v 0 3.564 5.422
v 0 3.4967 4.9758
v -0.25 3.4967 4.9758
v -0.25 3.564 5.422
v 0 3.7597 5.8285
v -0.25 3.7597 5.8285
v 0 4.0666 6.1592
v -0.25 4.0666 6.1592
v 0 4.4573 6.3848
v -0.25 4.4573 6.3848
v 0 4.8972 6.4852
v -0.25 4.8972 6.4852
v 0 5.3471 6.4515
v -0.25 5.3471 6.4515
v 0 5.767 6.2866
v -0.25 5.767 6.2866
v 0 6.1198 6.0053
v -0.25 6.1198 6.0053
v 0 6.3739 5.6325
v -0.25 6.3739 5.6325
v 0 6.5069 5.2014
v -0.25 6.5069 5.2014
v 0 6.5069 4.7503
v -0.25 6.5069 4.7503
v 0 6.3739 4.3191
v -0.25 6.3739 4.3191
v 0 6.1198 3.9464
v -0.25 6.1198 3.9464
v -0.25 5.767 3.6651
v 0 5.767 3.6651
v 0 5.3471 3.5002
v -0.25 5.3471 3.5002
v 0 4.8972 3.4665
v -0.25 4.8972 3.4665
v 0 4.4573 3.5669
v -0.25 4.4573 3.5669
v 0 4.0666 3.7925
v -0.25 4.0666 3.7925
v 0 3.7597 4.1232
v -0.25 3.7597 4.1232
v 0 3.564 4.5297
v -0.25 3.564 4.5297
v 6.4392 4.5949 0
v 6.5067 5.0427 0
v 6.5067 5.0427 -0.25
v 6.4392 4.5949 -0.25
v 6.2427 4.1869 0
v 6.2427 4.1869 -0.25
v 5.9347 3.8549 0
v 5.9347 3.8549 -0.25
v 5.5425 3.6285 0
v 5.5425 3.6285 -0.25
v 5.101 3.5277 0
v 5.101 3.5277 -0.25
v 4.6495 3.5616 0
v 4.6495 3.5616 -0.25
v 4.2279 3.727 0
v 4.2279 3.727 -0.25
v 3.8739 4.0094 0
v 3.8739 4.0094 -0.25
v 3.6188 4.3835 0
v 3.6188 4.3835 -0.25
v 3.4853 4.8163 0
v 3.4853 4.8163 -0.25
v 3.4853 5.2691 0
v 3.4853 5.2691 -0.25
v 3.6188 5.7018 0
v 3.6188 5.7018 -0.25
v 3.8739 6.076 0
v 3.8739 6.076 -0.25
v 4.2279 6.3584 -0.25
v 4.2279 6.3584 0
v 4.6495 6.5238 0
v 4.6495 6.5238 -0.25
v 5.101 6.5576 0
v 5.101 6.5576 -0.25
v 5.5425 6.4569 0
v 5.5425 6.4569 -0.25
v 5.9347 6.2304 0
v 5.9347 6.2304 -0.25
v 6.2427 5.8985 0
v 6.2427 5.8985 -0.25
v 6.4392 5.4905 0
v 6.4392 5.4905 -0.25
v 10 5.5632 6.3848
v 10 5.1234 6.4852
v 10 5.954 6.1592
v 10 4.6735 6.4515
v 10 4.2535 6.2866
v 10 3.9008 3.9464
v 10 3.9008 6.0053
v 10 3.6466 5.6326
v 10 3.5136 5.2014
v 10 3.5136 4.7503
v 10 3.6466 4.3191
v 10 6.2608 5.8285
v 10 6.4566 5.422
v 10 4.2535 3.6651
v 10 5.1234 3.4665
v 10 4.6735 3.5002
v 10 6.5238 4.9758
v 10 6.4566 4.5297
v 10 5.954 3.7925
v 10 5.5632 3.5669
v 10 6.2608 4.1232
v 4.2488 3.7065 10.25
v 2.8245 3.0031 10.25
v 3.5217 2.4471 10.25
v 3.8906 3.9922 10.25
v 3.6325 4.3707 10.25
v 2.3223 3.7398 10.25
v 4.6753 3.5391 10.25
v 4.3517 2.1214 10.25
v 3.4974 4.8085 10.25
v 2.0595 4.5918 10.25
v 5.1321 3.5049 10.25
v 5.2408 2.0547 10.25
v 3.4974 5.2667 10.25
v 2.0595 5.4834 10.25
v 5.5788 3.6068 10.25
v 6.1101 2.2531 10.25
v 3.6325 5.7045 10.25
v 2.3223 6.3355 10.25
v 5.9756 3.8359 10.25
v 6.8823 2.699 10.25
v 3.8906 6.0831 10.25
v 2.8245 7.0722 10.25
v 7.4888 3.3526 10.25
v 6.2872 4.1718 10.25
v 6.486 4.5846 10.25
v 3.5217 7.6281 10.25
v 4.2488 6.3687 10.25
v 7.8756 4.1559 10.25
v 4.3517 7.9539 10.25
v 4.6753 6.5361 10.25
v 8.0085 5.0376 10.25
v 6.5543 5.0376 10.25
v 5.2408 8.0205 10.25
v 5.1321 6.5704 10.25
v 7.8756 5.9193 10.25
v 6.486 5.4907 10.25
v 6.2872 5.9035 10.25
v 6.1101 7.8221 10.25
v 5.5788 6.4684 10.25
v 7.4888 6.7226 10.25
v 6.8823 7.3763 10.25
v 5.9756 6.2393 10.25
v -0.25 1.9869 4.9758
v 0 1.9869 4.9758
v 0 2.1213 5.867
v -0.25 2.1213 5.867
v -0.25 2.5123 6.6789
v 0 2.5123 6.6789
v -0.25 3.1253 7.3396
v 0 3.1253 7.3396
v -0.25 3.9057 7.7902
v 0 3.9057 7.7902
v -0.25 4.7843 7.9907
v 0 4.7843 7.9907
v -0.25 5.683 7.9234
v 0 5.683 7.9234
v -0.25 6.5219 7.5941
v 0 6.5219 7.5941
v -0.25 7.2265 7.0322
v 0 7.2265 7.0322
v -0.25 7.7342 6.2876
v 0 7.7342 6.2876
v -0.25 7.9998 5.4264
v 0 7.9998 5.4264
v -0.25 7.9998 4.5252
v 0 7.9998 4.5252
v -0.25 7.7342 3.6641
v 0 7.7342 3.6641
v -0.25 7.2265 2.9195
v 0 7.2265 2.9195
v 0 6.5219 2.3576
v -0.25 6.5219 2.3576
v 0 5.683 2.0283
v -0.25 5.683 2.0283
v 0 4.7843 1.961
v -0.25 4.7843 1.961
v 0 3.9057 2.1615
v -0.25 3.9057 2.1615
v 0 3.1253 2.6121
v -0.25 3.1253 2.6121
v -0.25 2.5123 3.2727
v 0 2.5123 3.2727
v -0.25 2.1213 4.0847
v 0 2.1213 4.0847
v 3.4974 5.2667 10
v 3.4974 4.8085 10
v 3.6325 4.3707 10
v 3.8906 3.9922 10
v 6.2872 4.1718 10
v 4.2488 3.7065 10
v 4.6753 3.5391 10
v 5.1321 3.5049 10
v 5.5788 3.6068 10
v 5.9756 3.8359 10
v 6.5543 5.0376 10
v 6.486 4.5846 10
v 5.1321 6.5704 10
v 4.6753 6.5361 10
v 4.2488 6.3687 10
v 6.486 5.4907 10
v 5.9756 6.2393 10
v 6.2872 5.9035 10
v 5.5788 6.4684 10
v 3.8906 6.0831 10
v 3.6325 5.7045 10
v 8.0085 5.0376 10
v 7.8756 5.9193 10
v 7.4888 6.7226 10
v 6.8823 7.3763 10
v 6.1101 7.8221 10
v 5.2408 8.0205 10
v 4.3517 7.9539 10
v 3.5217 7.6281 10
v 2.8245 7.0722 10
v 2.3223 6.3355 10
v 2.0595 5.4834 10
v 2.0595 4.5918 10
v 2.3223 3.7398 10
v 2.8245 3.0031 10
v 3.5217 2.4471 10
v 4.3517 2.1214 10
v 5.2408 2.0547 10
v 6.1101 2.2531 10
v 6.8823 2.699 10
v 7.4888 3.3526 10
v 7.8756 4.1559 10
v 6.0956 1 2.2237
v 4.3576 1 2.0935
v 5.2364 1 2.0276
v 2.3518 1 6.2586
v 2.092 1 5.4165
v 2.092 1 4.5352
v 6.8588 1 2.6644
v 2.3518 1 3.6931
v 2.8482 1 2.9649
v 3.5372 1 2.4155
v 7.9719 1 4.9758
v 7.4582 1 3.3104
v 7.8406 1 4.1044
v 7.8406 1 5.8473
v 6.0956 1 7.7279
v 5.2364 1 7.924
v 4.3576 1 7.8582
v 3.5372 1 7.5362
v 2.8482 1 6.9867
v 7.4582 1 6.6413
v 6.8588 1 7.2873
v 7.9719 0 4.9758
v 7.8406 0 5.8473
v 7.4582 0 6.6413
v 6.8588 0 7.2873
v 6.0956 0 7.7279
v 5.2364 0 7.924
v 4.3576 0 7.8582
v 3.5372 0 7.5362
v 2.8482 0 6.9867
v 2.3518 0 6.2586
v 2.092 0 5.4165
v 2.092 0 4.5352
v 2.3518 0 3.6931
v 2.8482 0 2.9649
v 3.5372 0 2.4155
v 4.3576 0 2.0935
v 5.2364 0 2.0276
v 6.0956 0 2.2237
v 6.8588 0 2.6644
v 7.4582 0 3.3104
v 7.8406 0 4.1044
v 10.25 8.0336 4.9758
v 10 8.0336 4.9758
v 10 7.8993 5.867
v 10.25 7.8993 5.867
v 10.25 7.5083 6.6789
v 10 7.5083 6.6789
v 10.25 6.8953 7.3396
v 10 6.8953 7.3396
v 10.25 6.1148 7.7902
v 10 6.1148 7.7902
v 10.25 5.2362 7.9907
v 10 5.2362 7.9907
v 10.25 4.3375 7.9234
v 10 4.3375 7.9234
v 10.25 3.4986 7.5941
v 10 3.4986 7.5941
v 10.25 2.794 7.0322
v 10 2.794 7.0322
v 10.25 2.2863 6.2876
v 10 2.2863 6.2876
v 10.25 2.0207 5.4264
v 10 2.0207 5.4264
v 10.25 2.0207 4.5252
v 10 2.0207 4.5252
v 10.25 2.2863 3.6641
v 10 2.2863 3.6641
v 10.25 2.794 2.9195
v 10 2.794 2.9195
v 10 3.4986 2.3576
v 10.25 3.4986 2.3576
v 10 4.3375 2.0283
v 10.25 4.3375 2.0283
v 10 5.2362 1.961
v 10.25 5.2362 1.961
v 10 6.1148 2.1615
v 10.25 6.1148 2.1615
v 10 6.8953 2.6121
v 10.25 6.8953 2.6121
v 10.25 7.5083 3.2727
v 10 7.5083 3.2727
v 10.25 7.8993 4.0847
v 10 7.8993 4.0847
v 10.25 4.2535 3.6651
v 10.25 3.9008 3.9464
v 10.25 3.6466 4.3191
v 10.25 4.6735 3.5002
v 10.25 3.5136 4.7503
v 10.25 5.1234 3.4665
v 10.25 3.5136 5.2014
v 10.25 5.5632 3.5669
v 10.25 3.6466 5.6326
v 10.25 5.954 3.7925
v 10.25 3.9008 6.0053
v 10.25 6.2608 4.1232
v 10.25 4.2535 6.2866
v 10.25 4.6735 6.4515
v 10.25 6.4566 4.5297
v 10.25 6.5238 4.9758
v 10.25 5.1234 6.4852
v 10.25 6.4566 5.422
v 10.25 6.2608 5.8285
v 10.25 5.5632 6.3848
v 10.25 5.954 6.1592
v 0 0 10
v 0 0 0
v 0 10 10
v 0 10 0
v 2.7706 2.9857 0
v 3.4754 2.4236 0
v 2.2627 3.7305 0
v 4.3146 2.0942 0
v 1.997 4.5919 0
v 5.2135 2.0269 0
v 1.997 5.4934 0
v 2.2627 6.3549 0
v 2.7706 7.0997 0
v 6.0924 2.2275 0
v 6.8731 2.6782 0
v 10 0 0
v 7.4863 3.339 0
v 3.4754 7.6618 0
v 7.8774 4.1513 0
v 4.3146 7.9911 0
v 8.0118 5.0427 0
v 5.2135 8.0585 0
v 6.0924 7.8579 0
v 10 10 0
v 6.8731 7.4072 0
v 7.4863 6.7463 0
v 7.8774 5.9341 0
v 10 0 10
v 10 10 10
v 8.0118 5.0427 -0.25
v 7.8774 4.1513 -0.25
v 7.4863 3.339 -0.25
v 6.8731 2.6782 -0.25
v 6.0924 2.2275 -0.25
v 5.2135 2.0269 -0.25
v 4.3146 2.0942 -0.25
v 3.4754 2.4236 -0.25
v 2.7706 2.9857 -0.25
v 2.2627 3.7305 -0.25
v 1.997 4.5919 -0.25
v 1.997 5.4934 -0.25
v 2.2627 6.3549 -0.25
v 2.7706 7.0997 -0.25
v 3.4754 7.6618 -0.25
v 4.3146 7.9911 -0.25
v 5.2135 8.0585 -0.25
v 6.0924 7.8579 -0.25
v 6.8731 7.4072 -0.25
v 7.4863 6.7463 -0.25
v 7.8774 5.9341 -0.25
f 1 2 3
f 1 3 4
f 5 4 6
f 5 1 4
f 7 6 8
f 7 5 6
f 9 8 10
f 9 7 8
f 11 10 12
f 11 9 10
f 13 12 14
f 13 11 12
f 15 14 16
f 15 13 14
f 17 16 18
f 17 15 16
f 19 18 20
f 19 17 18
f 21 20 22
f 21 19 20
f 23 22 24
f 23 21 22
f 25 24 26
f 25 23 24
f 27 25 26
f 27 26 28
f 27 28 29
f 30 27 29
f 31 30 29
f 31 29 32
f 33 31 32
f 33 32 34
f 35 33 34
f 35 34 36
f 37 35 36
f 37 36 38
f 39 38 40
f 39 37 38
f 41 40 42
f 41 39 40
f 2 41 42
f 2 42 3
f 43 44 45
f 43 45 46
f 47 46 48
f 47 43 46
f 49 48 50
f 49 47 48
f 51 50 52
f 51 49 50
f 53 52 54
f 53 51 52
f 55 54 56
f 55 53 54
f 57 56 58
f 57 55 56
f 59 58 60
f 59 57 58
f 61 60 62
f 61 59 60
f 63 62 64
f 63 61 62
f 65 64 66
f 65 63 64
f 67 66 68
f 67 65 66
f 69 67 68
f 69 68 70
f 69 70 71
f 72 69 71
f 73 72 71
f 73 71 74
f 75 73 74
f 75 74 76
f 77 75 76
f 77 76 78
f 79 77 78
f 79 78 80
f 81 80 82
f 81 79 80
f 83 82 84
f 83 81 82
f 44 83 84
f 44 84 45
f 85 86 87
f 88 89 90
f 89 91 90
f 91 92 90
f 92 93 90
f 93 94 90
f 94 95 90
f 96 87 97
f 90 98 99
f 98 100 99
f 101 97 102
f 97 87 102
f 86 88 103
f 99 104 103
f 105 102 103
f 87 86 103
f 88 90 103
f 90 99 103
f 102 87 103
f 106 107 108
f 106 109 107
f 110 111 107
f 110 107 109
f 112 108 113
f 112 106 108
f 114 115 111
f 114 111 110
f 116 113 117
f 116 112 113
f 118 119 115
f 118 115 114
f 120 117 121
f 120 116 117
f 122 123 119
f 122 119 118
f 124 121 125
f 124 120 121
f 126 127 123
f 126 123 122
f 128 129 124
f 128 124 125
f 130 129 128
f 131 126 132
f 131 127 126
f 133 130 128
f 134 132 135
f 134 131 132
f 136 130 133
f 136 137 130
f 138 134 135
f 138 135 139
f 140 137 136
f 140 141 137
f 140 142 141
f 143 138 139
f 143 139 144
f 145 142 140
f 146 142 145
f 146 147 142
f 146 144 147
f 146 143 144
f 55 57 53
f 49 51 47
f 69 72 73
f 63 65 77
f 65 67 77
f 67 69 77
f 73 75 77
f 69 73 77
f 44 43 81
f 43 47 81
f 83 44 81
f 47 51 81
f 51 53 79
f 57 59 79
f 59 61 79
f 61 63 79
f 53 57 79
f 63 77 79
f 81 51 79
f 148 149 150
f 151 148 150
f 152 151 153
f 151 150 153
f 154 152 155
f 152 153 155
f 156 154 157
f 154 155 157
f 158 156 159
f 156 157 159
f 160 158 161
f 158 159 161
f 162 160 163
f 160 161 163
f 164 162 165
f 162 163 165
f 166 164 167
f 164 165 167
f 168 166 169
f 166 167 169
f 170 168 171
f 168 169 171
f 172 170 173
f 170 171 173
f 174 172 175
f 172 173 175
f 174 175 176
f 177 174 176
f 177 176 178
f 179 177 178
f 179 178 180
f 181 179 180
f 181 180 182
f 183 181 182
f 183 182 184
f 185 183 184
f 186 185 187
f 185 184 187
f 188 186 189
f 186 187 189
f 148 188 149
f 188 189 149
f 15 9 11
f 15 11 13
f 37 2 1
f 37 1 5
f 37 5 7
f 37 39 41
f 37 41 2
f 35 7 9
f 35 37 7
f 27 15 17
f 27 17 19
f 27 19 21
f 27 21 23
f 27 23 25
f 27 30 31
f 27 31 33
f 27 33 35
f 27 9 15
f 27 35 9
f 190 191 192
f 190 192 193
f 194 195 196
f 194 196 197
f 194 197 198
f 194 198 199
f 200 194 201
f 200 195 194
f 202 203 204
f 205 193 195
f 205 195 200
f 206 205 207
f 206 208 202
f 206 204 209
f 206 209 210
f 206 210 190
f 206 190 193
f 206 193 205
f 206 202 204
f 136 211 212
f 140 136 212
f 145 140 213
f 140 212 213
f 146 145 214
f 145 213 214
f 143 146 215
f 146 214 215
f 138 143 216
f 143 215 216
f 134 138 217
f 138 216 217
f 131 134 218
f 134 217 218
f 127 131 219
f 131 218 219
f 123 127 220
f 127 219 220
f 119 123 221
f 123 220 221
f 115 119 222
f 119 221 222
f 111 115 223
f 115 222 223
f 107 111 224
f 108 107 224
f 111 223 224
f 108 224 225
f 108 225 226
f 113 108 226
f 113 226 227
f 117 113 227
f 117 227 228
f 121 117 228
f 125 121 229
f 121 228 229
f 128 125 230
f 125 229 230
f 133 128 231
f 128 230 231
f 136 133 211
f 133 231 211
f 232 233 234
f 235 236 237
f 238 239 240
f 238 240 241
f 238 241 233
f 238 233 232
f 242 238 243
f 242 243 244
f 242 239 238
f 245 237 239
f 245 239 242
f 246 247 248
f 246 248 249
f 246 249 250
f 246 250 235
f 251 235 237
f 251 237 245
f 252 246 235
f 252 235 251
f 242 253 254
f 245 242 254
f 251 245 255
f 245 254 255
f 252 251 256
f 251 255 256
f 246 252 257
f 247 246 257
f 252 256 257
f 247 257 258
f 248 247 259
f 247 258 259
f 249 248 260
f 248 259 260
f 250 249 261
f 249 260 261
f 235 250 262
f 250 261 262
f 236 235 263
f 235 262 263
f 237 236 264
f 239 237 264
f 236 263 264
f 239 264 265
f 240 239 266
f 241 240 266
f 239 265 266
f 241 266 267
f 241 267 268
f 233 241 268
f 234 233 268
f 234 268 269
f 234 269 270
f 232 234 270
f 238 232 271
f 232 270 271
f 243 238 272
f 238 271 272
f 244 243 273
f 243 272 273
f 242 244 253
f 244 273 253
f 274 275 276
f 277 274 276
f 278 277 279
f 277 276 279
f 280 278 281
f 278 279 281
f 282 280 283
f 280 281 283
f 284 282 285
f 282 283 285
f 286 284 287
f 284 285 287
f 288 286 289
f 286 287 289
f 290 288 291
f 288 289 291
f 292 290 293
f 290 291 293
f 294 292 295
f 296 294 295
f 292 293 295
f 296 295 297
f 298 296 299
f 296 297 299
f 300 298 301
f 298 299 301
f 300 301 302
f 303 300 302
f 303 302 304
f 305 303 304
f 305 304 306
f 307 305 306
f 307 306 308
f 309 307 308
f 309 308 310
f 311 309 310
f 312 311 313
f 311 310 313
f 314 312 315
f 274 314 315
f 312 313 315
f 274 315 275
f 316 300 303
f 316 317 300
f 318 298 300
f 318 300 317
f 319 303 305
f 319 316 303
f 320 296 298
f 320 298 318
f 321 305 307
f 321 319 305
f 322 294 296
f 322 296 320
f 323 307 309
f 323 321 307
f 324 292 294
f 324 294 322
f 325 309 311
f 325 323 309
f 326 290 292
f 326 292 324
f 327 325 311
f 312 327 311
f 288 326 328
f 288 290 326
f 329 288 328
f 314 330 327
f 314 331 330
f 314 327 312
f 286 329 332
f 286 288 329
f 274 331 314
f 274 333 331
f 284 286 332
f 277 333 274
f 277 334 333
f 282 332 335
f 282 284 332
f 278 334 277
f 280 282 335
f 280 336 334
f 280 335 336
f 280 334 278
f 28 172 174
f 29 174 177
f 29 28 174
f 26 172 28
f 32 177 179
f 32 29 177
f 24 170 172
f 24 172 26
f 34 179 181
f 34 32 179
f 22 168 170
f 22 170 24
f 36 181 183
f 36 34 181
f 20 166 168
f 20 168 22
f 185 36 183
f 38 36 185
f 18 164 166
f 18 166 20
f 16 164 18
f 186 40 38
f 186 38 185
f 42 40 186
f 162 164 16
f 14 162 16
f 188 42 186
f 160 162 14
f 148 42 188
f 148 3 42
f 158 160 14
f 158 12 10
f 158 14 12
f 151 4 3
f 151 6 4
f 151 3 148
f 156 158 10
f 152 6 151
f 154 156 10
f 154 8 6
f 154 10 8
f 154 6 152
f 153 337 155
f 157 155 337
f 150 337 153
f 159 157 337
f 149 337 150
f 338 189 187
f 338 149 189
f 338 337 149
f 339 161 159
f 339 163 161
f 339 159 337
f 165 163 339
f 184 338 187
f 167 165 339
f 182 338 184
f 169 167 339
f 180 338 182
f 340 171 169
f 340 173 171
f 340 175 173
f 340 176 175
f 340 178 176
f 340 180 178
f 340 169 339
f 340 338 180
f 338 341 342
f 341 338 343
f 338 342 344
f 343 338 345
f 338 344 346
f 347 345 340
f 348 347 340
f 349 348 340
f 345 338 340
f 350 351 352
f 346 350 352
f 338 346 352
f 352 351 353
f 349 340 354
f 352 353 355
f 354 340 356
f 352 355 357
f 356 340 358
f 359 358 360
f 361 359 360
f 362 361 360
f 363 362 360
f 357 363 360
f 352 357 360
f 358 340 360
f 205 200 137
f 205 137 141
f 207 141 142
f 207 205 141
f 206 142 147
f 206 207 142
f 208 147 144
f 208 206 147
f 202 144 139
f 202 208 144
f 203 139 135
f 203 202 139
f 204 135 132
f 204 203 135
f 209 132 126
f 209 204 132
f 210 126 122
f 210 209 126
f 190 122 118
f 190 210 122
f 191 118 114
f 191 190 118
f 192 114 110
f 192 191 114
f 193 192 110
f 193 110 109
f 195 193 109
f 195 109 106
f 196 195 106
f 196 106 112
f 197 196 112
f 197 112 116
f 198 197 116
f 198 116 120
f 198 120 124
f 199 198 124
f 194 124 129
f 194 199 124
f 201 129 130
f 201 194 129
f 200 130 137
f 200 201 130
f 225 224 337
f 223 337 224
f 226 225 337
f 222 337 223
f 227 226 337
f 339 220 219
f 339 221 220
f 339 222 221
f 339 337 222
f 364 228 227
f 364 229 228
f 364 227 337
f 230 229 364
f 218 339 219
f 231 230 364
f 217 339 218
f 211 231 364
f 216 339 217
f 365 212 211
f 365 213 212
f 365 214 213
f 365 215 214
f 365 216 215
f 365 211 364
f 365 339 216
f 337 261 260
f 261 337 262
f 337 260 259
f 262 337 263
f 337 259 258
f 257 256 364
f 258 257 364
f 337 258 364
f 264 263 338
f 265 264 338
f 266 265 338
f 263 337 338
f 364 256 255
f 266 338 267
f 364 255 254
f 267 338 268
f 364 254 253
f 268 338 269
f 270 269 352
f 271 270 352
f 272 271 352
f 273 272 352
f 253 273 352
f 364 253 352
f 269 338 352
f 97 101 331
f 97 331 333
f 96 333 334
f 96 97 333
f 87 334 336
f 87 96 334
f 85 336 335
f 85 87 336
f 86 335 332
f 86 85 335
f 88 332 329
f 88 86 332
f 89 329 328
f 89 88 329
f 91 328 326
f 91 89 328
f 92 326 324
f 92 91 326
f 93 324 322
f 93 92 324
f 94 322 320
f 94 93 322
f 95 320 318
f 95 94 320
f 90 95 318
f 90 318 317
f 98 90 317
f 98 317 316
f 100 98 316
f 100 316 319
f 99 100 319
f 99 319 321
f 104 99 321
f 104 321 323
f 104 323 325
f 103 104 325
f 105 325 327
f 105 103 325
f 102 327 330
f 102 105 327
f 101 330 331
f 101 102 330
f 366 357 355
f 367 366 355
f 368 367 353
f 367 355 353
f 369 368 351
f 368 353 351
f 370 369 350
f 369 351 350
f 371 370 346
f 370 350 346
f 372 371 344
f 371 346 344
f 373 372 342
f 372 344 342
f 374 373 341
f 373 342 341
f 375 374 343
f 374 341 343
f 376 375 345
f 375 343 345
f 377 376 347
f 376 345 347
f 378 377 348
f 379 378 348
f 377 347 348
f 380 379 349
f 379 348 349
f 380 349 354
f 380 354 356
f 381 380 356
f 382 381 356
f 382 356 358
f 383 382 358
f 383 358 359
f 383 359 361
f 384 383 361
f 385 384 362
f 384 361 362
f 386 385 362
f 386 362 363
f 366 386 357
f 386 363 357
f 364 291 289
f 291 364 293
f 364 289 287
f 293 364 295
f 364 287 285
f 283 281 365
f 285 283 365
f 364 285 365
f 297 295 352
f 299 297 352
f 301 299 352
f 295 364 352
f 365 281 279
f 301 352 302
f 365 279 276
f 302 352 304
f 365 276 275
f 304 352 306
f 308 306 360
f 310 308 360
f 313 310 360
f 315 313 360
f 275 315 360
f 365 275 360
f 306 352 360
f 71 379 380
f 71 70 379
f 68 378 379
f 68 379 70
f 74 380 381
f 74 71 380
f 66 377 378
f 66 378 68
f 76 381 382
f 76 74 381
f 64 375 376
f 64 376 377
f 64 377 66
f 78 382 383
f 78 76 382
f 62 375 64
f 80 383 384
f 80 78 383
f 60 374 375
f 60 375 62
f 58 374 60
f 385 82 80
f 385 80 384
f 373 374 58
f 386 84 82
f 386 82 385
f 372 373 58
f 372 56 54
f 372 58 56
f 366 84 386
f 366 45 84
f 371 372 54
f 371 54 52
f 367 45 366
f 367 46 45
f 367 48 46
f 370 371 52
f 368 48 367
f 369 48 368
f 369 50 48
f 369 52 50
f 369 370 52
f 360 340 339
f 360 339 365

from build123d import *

# Parameters (mm, degrees)
BOX_W         = 10
BOX_H         = 10
BOX_DEPTH     = 10
SKETCH_R      = 2.991239
SKETCH_R_2    = 1.537038
PAD_DEPTH     = 0.25
SKETCH001_R   = 3.024278
SKETCH001_R_2 = 1.519206
PAD001_DEPTH  = 0.25
SKETCH002_R   = 3.023334
SKETCH002_R_2 = 1.513555
PAD002_DEPTH  = 0.25
SKETCH003_R   = 3.023333
SKETCH003_R_2 = 1.513555
PAD003_DEPTH  = 0.25
SKETCH004_R   = 2.956459
POCKET_DEPTH  = 1


with BuildPart() as part:
    # Box → Box (new body)
    with BuildSketch(Plane.XY):
        with Locations((5, 5)):
            Rectangle(BOX_W, BOX_H)
    extrude(amount=BOX_DEPTH)

    # Sketch → Pad (new body)
    with BuildSketch(Plane.XY.offset(10)):
        with Locations((5.01728, 5.037612)):
            Circle(SKETCH_R)
        with Locations((5.01728, 5.037612)):
            Circle(SKETCH_R_2, mode=Mode.SUBTRACT)
    extrude(amount=PAD_DEPTH)

    # Sketch001 → Pad001 (new body)
    with BuildSketch(Plane(origin=(0, 0, 0), x_dir=(1, 0, 0), z_dir=(0, 0, -1))):
        with Locations((4.987519, -5.042684)):
            Circle(SKETCH001_R)
        with Locations((4.987519, -5.042684)):
            Circle(SKETCH001_R_2, mode=Mode.SUBTRACT)
    extrude(amount=PAD001_DEPTH)

    # Sketch002 → Pad002 (new body)
    with BuildSketch(Plane.YZ.offset(10)):
        with Locations((5.010271, 4.975845)):
            Circle(SKETCH002_R)
        with Locations((5.010271, 4.975845)):
            Circle(SKETCH002_R_2, mode=Mode.SUBTRACT)
    extrude(amount=PAD002_DEPTH)

    # Sketch003 → Pad003 (new body)
    with BuildSketch(Plane(origin=(0, 0, 0), x_dir=(0, -1, 0), z_dir=(-1, 0, 0))):
        with Locations((-5.010272, 4.975843)):
            Circle(SKETCH003_R)
        with Locations((-5.010272, 4.975843)):
            Circle(SKETCH003_R_2, mode=Mode.SUBTRACT)
    extrude(amount=PAD003_DEPTH)

    # Sketch004 → Pocket (cut)
    with BuildSketch(Plane.XZ):
        with Locations((5.015462, 4.975839)):
            Circle(SKETCH004_R)
    extrude(amount=-POCKET_DEPTH, mode=Mode.SUBTRACT)


solid = part.part
